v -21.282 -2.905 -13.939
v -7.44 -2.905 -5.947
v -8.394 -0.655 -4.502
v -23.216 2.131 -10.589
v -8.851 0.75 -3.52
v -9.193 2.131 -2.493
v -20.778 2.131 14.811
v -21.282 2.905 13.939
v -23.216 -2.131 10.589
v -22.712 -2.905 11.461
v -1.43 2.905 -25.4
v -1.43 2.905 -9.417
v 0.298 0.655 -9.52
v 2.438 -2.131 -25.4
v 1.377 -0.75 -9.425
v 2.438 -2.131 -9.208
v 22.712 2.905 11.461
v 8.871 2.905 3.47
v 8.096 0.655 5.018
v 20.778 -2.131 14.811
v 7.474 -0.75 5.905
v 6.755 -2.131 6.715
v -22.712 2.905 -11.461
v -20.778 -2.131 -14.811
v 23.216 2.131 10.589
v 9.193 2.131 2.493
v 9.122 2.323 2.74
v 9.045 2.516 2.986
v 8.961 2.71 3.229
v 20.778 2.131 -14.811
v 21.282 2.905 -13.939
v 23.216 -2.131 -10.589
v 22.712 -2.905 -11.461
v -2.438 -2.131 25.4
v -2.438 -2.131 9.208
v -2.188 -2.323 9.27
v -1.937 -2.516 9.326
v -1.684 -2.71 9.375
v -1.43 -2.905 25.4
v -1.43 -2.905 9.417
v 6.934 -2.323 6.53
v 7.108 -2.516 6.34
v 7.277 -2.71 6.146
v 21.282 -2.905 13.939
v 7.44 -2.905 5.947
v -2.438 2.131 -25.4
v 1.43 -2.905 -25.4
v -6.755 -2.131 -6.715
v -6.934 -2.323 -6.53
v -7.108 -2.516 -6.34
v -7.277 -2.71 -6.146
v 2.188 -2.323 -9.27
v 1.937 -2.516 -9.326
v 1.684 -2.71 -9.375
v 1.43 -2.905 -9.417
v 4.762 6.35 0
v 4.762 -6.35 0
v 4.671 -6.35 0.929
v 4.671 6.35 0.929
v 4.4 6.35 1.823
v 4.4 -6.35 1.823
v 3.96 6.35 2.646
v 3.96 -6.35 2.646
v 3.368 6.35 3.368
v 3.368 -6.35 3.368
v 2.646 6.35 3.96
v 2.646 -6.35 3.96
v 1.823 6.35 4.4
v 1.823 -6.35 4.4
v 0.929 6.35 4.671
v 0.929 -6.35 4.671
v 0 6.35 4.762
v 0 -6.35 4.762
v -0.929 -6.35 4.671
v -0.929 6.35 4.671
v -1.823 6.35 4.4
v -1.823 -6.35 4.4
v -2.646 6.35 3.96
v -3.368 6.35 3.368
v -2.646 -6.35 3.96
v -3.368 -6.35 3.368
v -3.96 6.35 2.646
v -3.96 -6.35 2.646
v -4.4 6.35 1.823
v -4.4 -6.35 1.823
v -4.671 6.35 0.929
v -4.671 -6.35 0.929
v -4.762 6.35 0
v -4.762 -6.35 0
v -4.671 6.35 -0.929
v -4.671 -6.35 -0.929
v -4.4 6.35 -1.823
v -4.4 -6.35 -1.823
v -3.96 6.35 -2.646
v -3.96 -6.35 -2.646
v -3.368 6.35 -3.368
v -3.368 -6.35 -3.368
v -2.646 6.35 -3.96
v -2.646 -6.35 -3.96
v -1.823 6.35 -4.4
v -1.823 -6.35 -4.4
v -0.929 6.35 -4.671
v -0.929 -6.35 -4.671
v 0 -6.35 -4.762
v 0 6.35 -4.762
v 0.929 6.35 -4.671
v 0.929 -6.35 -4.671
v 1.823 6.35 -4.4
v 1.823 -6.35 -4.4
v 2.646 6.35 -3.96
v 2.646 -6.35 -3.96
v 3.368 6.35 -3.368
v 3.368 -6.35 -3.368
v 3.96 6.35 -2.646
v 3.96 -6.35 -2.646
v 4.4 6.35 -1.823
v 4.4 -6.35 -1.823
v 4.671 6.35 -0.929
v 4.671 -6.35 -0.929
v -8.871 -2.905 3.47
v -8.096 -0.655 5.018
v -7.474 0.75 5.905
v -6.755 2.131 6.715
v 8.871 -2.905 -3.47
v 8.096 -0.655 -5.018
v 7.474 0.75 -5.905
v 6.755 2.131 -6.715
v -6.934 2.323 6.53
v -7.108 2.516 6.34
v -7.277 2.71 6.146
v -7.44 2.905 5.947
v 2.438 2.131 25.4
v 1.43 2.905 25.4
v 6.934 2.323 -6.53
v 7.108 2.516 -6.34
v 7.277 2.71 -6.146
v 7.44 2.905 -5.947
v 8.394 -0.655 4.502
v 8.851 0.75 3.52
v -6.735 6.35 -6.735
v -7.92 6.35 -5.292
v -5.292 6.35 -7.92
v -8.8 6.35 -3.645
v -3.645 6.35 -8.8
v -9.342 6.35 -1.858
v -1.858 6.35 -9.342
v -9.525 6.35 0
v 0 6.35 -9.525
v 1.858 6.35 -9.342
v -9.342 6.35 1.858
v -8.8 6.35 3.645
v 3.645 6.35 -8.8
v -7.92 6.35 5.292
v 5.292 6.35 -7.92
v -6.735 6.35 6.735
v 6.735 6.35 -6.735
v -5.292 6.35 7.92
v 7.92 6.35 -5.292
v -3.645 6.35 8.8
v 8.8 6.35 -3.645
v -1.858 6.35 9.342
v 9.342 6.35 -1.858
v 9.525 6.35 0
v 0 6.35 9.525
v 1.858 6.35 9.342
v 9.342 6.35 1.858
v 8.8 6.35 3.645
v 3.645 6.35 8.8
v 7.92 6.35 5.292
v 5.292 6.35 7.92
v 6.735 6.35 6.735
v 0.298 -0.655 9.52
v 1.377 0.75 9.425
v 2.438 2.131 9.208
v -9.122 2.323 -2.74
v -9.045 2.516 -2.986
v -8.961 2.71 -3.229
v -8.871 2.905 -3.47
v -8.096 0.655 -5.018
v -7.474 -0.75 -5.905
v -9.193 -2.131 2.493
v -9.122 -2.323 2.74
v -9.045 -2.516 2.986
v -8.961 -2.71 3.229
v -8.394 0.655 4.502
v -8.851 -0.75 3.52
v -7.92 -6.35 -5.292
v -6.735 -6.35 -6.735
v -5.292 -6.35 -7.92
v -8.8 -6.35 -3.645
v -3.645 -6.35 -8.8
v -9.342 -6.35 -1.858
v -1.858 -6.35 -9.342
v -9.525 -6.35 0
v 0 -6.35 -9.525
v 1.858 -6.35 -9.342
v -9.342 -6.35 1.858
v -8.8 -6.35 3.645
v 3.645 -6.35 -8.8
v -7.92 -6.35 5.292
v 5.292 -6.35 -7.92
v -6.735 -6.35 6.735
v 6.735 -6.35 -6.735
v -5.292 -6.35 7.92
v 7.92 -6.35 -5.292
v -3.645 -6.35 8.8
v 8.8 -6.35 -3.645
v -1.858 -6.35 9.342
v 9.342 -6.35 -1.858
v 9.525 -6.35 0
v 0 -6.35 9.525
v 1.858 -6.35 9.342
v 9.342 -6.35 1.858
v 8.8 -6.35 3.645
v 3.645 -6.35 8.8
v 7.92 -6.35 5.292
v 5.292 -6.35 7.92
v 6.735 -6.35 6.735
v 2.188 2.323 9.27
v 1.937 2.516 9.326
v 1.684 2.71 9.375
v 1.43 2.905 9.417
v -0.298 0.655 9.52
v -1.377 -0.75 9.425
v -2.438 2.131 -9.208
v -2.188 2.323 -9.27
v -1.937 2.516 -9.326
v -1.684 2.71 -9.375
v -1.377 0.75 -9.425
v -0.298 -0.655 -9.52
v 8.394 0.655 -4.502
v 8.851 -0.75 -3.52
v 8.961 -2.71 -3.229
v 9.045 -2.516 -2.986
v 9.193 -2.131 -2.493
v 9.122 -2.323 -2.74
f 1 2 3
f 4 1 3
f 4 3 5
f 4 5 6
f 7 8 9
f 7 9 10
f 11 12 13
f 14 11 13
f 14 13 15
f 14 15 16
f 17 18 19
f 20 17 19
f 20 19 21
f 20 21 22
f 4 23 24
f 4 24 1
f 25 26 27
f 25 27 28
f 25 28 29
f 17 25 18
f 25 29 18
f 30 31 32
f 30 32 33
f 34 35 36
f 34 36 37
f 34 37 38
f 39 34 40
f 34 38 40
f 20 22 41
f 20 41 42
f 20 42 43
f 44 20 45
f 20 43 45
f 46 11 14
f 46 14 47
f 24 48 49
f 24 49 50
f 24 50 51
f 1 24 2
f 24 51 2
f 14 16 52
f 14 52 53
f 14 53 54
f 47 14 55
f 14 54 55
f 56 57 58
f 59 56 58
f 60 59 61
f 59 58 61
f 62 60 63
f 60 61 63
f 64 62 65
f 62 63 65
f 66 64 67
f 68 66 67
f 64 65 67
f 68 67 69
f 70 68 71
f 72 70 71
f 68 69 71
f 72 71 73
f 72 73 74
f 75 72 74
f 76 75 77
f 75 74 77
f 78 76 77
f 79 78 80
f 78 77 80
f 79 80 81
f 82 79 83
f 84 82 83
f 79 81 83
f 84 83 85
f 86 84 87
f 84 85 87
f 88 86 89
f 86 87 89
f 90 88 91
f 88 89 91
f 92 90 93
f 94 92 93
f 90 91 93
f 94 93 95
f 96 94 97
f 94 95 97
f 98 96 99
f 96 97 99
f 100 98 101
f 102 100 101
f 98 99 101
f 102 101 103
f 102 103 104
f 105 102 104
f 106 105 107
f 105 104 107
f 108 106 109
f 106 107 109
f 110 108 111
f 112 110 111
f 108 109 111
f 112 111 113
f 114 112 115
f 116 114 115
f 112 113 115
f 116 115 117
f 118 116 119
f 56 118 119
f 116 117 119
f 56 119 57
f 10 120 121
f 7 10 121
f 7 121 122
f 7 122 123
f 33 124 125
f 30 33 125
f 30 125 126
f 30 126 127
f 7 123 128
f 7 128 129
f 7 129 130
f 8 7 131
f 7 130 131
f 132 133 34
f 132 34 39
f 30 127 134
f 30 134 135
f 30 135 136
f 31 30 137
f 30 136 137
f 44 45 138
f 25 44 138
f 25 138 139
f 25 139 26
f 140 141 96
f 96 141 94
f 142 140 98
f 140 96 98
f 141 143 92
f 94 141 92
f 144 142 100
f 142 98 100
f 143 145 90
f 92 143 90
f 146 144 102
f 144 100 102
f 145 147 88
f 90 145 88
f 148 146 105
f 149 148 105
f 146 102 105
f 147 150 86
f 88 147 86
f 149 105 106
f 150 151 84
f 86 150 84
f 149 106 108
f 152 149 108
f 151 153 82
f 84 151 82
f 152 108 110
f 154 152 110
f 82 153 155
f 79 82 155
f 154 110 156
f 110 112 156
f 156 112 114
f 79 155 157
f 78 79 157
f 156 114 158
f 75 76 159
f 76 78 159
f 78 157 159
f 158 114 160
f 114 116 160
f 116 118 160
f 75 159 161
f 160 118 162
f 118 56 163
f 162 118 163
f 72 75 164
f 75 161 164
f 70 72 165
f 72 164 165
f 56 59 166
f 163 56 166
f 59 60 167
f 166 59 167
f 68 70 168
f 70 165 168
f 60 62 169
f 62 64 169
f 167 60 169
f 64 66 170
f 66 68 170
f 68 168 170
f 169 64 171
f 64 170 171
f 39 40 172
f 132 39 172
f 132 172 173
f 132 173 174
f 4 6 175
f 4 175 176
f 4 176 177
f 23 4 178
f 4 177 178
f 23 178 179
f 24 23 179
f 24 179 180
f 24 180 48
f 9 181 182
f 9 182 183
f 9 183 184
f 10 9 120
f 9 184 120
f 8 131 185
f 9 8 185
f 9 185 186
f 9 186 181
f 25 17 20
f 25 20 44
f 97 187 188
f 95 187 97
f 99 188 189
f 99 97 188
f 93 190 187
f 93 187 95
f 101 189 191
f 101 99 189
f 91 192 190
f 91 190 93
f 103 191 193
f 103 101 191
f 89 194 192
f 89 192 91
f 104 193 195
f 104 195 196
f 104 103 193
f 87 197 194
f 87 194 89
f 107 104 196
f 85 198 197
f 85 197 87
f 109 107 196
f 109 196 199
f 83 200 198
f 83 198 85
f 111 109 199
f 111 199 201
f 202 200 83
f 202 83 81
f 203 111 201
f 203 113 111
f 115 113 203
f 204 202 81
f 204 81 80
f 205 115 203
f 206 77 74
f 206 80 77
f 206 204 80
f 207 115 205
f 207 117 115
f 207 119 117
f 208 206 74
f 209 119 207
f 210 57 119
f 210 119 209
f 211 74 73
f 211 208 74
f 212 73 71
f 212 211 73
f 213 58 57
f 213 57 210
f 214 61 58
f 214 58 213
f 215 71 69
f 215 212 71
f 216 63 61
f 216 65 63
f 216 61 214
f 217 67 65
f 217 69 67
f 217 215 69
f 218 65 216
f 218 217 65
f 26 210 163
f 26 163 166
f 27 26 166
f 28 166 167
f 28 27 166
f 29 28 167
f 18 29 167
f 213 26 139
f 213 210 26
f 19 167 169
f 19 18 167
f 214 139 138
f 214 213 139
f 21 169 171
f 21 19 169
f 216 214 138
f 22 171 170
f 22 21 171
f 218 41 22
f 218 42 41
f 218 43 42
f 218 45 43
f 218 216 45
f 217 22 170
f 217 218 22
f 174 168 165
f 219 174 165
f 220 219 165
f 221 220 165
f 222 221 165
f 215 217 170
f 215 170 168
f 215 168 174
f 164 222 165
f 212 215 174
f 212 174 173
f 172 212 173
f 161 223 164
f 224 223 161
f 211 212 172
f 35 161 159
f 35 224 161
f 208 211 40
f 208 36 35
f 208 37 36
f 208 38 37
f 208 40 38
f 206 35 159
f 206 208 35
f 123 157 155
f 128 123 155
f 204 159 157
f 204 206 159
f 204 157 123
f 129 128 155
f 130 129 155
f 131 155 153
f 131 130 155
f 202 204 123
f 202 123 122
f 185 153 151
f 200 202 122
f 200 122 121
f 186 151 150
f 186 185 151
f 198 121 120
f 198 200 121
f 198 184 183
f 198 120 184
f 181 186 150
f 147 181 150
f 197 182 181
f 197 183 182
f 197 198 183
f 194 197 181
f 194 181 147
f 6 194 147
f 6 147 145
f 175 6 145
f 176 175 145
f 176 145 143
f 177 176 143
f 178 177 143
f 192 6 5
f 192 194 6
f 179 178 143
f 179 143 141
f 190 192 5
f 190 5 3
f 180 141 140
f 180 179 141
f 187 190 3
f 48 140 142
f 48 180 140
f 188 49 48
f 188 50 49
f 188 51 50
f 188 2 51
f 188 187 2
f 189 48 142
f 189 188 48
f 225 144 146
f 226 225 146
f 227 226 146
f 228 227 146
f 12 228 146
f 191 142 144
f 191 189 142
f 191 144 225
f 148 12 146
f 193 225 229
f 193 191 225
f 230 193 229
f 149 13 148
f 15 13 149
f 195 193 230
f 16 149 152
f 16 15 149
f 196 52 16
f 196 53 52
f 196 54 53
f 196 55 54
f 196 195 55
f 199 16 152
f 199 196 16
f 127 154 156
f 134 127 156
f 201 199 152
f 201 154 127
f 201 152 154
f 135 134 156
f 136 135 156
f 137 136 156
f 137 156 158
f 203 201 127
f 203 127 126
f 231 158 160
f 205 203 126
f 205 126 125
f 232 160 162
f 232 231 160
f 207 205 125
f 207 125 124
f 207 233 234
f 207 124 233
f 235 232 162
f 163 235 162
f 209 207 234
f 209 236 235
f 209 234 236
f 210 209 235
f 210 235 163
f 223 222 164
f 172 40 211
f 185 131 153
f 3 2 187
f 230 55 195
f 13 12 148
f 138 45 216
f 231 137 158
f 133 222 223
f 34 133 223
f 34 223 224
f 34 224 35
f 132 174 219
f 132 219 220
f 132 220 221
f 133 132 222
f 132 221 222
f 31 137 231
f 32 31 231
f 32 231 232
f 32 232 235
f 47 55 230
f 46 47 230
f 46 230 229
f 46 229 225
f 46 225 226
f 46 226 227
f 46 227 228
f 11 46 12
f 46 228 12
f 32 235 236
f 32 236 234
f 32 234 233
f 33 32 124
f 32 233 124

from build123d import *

# Parameters (mm, degrees)
F1_DEPTH = 25.4
F3_COUNT = 6
F4_R     = 9.525
F5_DEPTH = 6.35
F6_R     = 4.7625
F7_DEPTH = 12.7


with BuildPart() as f1:
    # F0 (on Top) → F1 (new body)
    with BuildSketch(Plane.XY):
        Polygon((2.437655, 2.131124), (1.43048, 2.904751), (-2.437655, -2.131124), (-1.43048, -2.904751), align=None)
    extrude(amount=F1_DEPTH)



with BuildPart() as f3_1:
    # F3: instance of F1
    add(f1.part.rotate(Axis((0, 19.05, 0), (0, 1, 0)), 1 * 360 / F3_COUNT))


with BuildPart() as f3_2:
    # F3: instance of F1
    add(f1.part.rotate(Axis((0, 19.05, 0), (0, 1, 0)), 2 * 360 / F3_COUNT))


with BuildPart() as f3_3:
    # F3: instance of F1
    add(f1.part.rotate(Axis((0, 19.05, 0), (0, 1, 0)), 3 * 360 / F3_COUNT))


with BuildPart() as f3_4:
    # F3: instance of F1
    add(f1.part.rotate(Axis((0, 19.05, 0), (0, 1, 0)), 4 * 360 / F3_COUNT))


with BuildPart() as f3_5:
    # F3: instance of F1
    add(f1.part.rotate(Axis((0, 19.05, 0), (0, 1, 0)), 5 * 360 / F3_COUNT))


with BuildPart() as f1_1:
    add(f1.part)

    add(f3_1.part)  # F5 merges F3_1

    add(f3_2.part)  # F5 merges F3_2

    add(f3_3.part)  # F5 merges F3_3

    add(f3_4.part)  # F5 merges F3_4

    add(f3_5.part)  # F5 merges F3_5
    # F4 (on Front) → F5 (join, symmetric)
    with BuildSketch(Plane.XZ):
        Circle(F4_R)
    extrude(amount=F5_DEPTH, both=True)

    # F6 (on face) → F7 (cut)
    with BuildSketch(Plane.XZ.offset(6.35)):
        Circle(F6_R)
    extrude(amount=-F7_DEPTH, mode=Mode.SUBTRACT)


solid = f1_1.part
